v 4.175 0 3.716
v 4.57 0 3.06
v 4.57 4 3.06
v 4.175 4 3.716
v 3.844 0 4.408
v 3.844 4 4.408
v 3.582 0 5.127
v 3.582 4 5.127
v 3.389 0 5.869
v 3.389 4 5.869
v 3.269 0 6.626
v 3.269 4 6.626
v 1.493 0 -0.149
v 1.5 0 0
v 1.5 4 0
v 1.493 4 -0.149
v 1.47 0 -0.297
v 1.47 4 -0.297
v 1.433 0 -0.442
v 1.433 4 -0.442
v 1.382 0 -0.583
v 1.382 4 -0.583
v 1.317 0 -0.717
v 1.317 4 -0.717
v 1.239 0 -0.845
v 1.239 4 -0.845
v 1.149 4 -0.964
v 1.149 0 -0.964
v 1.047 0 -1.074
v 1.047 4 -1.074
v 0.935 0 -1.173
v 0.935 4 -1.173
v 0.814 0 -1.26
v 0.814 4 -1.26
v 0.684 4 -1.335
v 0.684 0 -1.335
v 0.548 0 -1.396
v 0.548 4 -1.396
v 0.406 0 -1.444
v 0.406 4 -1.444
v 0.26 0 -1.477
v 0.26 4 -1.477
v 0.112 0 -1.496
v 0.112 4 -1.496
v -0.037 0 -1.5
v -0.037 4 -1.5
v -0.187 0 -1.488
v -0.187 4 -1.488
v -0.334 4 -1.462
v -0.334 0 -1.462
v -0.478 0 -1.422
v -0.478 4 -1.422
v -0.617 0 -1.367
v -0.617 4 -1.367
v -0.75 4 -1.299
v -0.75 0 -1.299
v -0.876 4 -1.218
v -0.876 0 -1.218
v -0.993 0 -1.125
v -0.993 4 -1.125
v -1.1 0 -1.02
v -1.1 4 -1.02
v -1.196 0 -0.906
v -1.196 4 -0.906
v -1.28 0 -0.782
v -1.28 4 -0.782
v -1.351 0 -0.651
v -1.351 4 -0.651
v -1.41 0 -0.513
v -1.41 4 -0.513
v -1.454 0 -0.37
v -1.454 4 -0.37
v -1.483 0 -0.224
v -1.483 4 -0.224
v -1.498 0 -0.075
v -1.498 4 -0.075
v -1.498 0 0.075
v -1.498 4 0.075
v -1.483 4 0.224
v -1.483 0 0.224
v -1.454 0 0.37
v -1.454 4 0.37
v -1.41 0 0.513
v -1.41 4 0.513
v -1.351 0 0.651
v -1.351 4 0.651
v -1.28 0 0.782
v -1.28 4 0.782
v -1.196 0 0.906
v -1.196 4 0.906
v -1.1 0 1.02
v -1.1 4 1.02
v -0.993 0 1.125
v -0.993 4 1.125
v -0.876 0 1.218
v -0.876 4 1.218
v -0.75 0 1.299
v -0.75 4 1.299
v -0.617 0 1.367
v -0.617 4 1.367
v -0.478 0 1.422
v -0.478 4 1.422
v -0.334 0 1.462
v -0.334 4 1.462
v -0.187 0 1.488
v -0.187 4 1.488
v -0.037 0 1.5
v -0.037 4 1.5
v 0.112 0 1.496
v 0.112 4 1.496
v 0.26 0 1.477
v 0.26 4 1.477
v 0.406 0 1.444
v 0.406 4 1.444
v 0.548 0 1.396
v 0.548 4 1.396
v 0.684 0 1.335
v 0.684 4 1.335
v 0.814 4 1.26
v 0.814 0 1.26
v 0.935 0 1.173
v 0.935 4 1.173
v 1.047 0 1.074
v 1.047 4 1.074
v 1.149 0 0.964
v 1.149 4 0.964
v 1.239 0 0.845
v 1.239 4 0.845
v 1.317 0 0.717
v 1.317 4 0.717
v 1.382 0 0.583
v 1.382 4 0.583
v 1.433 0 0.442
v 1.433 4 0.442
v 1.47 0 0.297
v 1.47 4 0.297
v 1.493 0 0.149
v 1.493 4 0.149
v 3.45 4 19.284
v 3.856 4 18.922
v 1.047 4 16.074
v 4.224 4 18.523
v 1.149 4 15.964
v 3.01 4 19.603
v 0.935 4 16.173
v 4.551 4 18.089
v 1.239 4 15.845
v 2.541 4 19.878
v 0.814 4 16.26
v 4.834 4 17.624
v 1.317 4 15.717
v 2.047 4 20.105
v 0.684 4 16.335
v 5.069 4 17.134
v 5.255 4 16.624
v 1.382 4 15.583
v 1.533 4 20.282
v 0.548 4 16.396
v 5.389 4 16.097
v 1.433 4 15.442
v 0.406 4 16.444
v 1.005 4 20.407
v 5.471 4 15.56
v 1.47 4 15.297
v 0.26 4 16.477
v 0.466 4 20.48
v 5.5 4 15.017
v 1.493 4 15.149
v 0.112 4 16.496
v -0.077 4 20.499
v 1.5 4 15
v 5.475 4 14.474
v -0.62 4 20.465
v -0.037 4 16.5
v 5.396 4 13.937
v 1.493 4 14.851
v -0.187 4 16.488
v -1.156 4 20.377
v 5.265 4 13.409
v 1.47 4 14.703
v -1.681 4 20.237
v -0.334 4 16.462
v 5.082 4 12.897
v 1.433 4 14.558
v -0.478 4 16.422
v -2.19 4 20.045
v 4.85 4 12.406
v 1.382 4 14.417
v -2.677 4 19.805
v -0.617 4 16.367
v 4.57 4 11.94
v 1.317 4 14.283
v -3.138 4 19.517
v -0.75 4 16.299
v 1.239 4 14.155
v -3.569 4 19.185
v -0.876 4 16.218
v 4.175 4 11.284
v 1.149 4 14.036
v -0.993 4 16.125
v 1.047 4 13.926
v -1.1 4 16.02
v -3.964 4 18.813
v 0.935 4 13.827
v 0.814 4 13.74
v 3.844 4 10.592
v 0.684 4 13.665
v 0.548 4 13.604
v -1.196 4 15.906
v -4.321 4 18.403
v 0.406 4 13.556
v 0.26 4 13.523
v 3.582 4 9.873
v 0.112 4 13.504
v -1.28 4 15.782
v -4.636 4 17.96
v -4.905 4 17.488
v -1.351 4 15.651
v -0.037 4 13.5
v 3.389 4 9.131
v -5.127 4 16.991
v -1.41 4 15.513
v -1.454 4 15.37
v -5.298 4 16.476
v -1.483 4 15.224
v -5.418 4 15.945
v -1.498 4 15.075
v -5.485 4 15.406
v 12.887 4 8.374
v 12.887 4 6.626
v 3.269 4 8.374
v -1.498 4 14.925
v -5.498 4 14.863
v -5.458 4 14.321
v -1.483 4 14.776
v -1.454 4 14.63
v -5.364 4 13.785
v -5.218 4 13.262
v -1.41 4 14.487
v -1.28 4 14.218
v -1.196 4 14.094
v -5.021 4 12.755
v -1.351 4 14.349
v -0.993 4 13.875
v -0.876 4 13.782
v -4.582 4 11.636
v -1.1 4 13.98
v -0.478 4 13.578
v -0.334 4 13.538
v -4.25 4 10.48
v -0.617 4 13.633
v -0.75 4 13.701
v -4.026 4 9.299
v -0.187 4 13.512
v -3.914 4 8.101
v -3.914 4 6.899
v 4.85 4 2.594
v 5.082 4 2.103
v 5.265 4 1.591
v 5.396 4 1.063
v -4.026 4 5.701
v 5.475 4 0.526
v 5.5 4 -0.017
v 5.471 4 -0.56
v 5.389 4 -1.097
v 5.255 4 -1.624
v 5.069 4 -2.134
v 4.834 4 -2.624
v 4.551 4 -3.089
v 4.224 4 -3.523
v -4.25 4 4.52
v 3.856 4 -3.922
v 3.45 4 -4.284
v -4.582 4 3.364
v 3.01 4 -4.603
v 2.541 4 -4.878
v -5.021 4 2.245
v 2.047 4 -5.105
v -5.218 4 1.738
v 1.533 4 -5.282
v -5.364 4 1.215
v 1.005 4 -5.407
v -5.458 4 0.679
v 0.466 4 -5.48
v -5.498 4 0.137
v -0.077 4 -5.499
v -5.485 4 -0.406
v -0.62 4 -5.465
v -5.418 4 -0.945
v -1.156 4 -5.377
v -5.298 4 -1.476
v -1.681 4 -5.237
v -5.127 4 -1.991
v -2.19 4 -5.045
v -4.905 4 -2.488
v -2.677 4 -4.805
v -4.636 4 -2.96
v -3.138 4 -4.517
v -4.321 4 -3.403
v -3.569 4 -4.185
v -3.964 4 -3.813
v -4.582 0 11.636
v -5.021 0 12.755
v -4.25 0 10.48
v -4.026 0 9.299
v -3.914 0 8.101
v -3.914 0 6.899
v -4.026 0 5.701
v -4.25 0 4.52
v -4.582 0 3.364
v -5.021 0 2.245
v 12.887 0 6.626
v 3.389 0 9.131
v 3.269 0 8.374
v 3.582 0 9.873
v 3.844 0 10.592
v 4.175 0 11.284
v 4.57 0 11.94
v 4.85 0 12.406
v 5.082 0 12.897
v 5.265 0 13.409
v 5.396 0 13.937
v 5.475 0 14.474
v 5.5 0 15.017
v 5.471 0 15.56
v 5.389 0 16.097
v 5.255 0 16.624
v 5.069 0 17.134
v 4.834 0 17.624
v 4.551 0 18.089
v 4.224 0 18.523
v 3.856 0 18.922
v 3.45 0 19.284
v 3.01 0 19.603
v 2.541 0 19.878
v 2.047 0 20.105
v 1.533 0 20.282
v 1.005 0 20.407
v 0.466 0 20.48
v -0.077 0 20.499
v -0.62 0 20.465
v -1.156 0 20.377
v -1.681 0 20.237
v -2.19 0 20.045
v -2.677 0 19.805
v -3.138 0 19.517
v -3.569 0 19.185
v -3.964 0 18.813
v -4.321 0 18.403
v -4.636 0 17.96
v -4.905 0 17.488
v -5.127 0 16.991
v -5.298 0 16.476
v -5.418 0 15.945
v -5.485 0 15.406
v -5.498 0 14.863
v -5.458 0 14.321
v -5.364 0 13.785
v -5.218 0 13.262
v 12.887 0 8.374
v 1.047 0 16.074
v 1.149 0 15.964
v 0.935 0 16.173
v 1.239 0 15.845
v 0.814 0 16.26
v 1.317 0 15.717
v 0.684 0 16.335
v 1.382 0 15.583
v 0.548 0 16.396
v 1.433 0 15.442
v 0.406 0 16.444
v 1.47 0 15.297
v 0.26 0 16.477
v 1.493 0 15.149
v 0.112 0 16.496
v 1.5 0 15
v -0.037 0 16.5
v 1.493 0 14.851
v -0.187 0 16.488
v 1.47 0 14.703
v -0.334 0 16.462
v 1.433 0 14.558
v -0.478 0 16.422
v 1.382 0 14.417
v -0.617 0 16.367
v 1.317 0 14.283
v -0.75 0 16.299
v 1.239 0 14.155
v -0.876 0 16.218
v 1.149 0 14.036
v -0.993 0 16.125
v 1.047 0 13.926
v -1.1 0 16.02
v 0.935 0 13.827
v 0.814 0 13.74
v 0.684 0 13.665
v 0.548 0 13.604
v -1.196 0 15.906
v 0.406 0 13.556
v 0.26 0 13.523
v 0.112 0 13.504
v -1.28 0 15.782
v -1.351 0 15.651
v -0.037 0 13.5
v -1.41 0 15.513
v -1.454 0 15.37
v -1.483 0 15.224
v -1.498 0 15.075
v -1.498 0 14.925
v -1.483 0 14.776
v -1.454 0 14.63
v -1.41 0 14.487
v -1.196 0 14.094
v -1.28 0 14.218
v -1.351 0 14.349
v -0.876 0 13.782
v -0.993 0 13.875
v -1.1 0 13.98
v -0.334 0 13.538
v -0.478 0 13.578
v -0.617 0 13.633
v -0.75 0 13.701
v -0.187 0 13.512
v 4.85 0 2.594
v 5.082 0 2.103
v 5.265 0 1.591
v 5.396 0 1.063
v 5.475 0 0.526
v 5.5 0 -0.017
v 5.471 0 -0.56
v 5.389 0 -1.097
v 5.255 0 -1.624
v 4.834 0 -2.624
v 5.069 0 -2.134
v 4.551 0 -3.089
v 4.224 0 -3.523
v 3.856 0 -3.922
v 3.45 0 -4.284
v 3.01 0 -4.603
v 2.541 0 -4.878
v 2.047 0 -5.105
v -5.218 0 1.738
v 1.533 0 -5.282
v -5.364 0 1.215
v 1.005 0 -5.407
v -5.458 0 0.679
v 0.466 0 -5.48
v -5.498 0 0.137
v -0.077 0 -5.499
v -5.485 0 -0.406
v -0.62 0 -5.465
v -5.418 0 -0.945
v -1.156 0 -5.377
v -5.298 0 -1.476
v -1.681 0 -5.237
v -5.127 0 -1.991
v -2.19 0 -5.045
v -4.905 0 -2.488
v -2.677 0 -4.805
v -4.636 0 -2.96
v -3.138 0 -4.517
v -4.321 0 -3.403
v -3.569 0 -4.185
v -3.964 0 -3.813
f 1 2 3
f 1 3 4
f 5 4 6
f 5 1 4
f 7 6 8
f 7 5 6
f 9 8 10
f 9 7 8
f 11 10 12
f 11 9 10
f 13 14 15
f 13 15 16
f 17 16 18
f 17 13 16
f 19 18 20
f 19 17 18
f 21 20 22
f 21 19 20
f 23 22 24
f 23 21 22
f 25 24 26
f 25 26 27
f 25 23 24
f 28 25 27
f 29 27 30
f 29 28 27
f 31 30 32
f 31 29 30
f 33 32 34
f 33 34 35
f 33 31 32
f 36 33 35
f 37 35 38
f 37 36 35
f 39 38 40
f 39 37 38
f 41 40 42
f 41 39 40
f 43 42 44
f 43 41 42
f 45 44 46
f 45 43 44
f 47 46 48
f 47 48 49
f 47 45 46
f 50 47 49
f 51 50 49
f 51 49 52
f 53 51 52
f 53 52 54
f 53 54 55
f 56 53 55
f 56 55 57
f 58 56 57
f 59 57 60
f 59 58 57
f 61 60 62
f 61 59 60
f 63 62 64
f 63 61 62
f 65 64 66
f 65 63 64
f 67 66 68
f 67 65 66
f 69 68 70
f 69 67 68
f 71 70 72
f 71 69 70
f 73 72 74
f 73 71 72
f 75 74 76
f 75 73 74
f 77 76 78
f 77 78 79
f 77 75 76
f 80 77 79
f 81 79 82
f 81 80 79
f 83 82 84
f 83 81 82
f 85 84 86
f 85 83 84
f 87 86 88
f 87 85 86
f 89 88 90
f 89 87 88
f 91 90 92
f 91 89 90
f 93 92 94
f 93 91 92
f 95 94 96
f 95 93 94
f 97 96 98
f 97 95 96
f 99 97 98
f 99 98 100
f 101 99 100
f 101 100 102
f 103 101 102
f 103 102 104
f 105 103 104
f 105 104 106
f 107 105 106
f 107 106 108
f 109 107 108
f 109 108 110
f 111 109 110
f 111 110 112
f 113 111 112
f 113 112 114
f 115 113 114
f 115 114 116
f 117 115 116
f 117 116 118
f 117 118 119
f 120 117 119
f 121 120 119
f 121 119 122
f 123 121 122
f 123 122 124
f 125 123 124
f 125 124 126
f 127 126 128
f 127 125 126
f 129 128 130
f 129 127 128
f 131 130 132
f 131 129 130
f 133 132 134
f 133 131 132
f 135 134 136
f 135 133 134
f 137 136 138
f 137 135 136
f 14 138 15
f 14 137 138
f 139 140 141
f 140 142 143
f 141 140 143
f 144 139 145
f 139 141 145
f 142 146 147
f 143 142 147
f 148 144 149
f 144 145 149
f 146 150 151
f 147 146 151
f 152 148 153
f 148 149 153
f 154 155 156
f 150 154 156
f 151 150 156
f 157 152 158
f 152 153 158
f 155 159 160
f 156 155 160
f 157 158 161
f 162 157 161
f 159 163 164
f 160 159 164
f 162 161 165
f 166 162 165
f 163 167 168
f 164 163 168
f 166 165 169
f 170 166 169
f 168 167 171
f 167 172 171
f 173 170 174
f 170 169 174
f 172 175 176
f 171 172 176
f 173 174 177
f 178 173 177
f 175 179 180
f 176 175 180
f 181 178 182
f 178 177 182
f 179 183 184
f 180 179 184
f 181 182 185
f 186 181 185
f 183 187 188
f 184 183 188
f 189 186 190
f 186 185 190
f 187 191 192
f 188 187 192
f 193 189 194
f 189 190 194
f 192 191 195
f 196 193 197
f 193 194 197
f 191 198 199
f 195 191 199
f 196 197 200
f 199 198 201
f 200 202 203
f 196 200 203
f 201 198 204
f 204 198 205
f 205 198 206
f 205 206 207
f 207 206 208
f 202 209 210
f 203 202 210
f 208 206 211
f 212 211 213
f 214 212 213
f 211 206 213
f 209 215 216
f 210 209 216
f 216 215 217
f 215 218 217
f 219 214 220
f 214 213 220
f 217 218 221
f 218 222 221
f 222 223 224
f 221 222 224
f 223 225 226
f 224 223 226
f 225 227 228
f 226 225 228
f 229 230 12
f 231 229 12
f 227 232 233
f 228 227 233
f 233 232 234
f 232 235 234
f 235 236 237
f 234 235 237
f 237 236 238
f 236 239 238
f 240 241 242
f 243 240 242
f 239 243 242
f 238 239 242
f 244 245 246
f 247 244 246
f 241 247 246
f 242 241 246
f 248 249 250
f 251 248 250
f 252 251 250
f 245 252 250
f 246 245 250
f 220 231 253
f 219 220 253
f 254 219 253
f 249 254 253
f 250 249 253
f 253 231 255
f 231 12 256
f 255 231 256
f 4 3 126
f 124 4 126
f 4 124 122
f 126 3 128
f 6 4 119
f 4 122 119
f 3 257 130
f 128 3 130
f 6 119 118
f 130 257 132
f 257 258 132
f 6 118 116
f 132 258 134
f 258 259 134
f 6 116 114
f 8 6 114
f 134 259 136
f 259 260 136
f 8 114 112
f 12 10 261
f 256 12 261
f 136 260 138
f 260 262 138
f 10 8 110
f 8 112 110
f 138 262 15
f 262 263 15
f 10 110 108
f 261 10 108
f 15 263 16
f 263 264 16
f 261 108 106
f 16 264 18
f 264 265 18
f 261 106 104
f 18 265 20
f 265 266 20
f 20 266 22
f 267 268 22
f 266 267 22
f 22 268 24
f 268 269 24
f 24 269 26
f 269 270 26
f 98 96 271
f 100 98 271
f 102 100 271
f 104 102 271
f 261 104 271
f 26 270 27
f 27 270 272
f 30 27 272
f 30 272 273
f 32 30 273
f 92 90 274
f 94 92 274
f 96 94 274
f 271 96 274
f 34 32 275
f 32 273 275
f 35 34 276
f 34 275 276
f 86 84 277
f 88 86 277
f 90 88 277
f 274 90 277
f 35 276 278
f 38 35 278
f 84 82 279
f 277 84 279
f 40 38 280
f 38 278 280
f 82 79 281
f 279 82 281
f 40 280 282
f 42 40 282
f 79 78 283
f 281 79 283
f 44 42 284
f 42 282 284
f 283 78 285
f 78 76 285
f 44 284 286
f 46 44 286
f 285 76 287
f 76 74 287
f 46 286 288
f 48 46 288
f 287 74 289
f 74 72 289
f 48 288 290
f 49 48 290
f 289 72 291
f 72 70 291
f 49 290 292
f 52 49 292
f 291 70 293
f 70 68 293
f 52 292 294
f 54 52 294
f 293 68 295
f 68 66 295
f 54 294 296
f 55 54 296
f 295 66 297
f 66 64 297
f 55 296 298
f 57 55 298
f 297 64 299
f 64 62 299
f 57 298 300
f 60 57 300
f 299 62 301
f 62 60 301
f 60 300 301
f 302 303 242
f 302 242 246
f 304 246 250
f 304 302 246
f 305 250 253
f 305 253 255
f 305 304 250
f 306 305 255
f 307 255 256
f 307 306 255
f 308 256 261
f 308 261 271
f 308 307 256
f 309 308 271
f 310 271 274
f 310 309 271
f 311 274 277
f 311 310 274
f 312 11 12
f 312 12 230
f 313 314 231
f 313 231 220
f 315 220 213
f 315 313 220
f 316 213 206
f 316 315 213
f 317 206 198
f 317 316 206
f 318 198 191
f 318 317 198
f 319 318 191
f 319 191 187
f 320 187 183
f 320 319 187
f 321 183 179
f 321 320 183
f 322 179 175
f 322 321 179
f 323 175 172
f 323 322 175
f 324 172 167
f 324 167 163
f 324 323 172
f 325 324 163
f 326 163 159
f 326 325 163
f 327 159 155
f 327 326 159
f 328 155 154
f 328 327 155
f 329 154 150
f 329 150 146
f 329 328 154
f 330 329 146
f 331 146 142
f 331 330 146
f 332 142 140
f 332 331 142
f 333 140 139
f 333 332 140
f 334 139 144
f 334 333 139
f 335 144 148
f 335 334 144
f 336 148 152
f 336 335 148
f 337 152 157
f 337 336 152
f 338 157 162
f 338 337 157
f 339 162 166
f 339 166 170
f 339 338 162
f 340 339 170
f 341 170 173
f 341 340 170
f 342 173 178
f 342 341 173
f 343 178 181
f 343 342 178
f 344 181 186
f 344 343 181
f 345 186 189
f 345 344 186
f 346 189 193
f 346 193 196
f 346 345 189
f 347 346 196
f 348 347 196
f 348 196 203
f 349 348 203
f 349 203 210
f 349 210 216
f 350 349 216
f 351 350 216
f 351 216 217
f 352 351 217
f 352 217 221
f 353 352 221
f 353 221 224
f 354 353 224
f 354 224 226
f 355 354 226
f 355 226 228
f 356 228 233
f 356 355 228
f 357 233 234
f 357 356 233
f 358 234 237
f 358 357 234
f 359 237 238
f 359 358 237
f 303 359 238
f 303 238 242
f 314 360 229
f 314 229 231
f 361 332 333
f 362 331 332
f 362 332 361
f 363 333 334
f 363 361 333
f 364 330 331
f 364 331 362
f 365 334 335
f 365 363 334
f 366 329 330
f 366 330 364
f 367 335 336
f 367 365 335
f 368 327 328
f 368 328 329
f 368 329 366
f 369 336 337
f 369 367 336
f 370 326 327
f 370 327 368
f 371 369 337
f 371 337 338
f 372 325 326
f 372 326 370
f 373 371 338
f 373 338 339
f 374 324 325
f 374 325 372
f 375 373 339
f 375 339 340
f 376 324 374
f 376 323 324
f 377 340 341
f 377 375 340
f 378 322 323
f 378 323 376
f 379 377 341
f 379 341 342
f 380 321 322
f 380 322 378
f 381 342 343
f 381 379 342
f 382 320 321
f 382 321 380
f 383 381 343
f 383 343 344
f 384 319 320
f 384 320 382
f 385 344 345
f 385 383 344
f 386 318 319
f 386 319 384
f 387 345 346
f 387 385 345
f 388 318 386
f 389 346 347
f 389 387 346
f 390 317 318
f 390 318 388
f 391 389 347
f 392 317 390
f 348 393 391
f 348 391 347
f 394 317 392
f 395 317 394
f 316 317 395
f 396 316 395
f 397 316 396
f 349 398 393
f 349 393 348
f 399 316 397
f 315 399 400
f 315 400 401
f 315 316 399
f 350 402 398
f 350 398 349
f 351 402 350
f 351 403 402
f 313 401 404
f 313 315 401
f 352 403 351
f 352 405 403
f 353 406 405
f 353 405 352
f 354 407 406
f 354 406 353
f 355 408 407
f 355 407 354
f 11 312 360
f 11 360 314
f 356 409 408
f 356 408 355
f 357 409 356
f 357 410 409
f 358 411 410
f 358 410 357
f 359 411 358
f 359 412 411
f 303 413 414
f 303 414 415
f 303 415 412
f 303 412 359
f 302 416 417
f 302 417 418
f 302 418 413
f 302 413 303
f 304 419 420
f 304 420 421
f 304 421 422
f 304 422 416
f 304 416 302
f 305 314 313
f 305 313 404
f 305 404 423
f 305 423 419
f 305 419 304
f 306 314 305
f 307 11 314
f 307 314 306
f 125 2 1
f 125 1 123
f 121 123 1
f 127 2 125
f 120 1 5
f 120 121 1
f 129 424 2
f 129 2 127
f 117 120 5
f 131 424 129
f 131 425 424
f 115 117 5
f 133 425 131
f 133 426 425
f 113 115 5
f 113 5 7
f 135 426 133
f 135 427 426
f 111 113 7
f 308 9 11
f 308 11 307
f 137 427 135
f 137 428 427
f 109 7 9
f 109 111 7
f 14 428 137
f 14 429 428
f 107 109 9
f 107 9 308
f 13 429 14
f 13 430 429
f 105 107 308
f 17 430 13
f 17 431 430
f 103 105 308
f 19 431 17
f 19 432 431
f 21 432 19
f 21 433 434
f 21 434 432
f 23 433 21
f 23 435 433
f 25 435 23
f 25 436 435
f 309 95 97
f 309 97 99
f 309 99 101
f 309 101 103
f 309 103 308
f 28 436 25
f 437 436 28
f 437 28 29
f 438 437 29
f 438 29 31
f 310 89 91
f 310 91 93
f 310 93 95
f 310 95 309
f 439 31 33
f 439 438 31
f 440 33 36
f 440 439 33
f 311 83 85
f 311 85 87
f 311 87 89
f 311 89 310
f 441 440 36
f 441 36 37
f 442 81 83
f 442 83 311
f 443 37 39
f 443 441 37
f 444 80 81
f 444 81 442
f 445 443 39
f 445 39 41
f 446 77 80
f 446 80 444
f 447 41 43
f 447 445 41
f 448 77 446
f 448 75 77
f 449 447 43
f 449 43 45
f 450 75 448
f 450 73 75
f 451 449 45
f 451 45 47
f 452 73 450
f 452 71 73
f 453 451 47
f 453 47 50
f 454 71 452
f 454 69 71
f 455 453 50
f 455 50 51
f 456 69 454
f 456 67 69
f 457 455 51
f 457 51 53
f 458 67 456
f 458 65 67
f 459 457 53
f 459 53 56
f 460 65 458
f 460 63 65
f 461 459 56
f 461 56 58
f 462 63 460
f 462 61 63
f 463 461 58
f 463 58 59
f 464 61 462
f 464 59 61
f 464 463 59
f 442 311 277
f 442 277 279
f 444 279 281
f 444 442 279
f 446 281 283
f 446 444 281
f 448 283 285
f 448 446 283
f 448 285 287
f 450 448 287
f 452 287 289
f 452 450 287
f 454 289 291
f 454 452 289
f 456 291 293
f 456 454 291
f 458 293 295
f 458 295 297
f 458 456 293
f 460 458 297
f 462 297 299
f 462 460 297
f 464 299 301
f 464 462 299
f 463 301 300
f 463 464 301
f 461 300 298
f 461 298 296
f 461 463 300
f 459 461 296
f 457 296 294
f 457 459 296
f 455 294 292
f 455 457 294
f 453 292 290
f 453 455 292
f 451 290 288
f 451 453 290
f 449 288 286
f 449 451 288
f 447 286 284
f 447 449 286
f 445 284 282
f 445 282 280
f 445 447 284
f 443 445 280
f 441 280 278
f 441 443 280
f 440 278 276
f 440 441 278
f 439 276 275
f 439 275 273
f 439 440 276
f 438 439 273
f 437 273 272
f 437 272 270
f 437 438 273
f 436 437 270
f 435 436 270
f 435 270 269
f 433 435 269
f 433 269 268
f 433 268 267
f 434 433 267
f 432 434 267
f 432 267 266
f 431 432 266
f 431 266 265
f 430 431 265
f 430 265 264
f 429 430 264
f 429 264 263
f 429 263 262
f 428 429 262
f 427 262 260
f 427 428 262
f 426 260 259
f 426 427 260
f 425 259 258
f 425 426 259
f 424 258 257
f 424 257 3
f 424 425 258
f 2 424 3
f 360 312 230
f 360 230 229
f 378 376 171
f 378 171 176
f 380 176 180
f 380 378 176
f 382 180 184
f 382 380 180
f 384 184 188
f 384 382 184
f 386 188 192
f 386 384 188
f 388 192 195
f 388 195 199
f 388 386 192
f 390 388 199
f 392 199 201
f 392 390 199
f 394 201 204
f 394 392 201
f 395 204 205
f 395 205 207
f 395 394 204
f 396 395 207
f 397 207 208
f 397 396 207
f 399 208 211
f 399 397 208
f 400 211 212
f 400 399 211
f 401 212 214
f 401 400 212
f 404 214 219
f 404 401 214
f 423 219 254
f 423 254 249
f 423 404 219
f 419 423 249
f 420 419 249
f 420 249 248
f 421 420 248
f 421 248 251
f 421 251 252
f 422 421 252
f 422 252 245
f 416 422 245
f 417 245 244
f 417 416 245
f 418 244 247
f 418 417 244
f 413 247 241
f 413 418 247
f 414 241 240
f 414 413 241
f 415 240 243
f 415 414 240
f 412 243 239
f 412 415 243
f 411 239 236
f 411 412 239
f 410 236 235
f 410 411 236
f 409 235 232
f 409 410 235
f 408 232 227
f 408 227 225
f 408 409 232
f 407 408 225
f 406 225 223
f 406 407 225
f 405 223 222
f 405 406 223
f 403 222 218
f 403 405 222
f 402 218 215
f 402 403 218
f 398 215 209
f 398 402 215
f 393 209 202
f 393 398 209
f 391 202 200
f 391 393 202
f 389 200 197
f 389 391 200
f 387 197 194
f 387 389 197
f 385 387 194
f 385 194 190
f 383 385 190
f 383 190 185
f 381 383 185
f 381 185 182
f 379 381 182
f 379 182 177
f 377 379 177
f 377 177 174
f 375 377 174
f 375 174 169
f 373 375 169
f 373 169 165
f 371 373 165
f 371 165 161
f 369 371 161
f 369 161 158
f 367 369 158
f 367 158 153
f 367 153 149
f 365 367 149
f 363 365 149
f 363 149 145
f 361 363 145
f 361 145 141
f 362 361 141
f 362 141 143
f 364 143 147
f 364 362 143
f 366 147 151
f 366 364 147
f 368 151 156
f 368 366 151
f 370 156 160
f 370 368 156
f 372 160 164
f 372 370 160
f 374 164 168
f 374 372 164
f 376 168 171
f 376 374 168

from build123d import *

# Parameters (mm, degrees)
SKETCH1_R           = 1.5
BOSS_EXTRUDE1_DEPTH = 4


with BuildPart() as part:
    # Sketch1 → Boss-Extrude1 (new body)
    with BuildSketch(Plane(origin=(0, 0, 0), x_dir=(1, 0, 0), z_dir=(0, 1, 0))):
        with BuildLine():
            Line((3.268994099, -6.625644187), (12.886719117, -6.625644187))
            Line((12.886719117, -6.625644187), (12.886719117, -8.374355813))
            Line((12.886719117, -8.374355813), (3.268994099, -8.374355813))
            ThreePointArc((3.268994099, -8.374355813), (3.704492519, -10.235637907), (4.570133689, -11.939954566))
            ThreePointArc((4.570133689, -11.939954566), (0.465944189, -20.480227734), (-5.021146674, -12.755431873))
            ThreePointArc((-5.021146674, -12.755431873), (-3.899959484, -7.5), (-5.021146674, -2.244568127))
            ThreePointArc((-5.021146674, -2.244568127), (0.465944189, 5.480227734), (4.570133689, -3.060045434))
            ThreePointArc((4.570133689, -3.060045434), (3.704492519, -4.764362093), (3.268994099, -6.625644187))
        make_face()
        Circle(SKETCH1_R, mode=Mode.SUBTRACT)
        with Locations((0, -15)):
            Circle(SKETCH1_R, mode=Mode.SUBTRACT)
    extrude(amount=BOSS_EXTRUDE1_DEPTH)


solid = part.part
